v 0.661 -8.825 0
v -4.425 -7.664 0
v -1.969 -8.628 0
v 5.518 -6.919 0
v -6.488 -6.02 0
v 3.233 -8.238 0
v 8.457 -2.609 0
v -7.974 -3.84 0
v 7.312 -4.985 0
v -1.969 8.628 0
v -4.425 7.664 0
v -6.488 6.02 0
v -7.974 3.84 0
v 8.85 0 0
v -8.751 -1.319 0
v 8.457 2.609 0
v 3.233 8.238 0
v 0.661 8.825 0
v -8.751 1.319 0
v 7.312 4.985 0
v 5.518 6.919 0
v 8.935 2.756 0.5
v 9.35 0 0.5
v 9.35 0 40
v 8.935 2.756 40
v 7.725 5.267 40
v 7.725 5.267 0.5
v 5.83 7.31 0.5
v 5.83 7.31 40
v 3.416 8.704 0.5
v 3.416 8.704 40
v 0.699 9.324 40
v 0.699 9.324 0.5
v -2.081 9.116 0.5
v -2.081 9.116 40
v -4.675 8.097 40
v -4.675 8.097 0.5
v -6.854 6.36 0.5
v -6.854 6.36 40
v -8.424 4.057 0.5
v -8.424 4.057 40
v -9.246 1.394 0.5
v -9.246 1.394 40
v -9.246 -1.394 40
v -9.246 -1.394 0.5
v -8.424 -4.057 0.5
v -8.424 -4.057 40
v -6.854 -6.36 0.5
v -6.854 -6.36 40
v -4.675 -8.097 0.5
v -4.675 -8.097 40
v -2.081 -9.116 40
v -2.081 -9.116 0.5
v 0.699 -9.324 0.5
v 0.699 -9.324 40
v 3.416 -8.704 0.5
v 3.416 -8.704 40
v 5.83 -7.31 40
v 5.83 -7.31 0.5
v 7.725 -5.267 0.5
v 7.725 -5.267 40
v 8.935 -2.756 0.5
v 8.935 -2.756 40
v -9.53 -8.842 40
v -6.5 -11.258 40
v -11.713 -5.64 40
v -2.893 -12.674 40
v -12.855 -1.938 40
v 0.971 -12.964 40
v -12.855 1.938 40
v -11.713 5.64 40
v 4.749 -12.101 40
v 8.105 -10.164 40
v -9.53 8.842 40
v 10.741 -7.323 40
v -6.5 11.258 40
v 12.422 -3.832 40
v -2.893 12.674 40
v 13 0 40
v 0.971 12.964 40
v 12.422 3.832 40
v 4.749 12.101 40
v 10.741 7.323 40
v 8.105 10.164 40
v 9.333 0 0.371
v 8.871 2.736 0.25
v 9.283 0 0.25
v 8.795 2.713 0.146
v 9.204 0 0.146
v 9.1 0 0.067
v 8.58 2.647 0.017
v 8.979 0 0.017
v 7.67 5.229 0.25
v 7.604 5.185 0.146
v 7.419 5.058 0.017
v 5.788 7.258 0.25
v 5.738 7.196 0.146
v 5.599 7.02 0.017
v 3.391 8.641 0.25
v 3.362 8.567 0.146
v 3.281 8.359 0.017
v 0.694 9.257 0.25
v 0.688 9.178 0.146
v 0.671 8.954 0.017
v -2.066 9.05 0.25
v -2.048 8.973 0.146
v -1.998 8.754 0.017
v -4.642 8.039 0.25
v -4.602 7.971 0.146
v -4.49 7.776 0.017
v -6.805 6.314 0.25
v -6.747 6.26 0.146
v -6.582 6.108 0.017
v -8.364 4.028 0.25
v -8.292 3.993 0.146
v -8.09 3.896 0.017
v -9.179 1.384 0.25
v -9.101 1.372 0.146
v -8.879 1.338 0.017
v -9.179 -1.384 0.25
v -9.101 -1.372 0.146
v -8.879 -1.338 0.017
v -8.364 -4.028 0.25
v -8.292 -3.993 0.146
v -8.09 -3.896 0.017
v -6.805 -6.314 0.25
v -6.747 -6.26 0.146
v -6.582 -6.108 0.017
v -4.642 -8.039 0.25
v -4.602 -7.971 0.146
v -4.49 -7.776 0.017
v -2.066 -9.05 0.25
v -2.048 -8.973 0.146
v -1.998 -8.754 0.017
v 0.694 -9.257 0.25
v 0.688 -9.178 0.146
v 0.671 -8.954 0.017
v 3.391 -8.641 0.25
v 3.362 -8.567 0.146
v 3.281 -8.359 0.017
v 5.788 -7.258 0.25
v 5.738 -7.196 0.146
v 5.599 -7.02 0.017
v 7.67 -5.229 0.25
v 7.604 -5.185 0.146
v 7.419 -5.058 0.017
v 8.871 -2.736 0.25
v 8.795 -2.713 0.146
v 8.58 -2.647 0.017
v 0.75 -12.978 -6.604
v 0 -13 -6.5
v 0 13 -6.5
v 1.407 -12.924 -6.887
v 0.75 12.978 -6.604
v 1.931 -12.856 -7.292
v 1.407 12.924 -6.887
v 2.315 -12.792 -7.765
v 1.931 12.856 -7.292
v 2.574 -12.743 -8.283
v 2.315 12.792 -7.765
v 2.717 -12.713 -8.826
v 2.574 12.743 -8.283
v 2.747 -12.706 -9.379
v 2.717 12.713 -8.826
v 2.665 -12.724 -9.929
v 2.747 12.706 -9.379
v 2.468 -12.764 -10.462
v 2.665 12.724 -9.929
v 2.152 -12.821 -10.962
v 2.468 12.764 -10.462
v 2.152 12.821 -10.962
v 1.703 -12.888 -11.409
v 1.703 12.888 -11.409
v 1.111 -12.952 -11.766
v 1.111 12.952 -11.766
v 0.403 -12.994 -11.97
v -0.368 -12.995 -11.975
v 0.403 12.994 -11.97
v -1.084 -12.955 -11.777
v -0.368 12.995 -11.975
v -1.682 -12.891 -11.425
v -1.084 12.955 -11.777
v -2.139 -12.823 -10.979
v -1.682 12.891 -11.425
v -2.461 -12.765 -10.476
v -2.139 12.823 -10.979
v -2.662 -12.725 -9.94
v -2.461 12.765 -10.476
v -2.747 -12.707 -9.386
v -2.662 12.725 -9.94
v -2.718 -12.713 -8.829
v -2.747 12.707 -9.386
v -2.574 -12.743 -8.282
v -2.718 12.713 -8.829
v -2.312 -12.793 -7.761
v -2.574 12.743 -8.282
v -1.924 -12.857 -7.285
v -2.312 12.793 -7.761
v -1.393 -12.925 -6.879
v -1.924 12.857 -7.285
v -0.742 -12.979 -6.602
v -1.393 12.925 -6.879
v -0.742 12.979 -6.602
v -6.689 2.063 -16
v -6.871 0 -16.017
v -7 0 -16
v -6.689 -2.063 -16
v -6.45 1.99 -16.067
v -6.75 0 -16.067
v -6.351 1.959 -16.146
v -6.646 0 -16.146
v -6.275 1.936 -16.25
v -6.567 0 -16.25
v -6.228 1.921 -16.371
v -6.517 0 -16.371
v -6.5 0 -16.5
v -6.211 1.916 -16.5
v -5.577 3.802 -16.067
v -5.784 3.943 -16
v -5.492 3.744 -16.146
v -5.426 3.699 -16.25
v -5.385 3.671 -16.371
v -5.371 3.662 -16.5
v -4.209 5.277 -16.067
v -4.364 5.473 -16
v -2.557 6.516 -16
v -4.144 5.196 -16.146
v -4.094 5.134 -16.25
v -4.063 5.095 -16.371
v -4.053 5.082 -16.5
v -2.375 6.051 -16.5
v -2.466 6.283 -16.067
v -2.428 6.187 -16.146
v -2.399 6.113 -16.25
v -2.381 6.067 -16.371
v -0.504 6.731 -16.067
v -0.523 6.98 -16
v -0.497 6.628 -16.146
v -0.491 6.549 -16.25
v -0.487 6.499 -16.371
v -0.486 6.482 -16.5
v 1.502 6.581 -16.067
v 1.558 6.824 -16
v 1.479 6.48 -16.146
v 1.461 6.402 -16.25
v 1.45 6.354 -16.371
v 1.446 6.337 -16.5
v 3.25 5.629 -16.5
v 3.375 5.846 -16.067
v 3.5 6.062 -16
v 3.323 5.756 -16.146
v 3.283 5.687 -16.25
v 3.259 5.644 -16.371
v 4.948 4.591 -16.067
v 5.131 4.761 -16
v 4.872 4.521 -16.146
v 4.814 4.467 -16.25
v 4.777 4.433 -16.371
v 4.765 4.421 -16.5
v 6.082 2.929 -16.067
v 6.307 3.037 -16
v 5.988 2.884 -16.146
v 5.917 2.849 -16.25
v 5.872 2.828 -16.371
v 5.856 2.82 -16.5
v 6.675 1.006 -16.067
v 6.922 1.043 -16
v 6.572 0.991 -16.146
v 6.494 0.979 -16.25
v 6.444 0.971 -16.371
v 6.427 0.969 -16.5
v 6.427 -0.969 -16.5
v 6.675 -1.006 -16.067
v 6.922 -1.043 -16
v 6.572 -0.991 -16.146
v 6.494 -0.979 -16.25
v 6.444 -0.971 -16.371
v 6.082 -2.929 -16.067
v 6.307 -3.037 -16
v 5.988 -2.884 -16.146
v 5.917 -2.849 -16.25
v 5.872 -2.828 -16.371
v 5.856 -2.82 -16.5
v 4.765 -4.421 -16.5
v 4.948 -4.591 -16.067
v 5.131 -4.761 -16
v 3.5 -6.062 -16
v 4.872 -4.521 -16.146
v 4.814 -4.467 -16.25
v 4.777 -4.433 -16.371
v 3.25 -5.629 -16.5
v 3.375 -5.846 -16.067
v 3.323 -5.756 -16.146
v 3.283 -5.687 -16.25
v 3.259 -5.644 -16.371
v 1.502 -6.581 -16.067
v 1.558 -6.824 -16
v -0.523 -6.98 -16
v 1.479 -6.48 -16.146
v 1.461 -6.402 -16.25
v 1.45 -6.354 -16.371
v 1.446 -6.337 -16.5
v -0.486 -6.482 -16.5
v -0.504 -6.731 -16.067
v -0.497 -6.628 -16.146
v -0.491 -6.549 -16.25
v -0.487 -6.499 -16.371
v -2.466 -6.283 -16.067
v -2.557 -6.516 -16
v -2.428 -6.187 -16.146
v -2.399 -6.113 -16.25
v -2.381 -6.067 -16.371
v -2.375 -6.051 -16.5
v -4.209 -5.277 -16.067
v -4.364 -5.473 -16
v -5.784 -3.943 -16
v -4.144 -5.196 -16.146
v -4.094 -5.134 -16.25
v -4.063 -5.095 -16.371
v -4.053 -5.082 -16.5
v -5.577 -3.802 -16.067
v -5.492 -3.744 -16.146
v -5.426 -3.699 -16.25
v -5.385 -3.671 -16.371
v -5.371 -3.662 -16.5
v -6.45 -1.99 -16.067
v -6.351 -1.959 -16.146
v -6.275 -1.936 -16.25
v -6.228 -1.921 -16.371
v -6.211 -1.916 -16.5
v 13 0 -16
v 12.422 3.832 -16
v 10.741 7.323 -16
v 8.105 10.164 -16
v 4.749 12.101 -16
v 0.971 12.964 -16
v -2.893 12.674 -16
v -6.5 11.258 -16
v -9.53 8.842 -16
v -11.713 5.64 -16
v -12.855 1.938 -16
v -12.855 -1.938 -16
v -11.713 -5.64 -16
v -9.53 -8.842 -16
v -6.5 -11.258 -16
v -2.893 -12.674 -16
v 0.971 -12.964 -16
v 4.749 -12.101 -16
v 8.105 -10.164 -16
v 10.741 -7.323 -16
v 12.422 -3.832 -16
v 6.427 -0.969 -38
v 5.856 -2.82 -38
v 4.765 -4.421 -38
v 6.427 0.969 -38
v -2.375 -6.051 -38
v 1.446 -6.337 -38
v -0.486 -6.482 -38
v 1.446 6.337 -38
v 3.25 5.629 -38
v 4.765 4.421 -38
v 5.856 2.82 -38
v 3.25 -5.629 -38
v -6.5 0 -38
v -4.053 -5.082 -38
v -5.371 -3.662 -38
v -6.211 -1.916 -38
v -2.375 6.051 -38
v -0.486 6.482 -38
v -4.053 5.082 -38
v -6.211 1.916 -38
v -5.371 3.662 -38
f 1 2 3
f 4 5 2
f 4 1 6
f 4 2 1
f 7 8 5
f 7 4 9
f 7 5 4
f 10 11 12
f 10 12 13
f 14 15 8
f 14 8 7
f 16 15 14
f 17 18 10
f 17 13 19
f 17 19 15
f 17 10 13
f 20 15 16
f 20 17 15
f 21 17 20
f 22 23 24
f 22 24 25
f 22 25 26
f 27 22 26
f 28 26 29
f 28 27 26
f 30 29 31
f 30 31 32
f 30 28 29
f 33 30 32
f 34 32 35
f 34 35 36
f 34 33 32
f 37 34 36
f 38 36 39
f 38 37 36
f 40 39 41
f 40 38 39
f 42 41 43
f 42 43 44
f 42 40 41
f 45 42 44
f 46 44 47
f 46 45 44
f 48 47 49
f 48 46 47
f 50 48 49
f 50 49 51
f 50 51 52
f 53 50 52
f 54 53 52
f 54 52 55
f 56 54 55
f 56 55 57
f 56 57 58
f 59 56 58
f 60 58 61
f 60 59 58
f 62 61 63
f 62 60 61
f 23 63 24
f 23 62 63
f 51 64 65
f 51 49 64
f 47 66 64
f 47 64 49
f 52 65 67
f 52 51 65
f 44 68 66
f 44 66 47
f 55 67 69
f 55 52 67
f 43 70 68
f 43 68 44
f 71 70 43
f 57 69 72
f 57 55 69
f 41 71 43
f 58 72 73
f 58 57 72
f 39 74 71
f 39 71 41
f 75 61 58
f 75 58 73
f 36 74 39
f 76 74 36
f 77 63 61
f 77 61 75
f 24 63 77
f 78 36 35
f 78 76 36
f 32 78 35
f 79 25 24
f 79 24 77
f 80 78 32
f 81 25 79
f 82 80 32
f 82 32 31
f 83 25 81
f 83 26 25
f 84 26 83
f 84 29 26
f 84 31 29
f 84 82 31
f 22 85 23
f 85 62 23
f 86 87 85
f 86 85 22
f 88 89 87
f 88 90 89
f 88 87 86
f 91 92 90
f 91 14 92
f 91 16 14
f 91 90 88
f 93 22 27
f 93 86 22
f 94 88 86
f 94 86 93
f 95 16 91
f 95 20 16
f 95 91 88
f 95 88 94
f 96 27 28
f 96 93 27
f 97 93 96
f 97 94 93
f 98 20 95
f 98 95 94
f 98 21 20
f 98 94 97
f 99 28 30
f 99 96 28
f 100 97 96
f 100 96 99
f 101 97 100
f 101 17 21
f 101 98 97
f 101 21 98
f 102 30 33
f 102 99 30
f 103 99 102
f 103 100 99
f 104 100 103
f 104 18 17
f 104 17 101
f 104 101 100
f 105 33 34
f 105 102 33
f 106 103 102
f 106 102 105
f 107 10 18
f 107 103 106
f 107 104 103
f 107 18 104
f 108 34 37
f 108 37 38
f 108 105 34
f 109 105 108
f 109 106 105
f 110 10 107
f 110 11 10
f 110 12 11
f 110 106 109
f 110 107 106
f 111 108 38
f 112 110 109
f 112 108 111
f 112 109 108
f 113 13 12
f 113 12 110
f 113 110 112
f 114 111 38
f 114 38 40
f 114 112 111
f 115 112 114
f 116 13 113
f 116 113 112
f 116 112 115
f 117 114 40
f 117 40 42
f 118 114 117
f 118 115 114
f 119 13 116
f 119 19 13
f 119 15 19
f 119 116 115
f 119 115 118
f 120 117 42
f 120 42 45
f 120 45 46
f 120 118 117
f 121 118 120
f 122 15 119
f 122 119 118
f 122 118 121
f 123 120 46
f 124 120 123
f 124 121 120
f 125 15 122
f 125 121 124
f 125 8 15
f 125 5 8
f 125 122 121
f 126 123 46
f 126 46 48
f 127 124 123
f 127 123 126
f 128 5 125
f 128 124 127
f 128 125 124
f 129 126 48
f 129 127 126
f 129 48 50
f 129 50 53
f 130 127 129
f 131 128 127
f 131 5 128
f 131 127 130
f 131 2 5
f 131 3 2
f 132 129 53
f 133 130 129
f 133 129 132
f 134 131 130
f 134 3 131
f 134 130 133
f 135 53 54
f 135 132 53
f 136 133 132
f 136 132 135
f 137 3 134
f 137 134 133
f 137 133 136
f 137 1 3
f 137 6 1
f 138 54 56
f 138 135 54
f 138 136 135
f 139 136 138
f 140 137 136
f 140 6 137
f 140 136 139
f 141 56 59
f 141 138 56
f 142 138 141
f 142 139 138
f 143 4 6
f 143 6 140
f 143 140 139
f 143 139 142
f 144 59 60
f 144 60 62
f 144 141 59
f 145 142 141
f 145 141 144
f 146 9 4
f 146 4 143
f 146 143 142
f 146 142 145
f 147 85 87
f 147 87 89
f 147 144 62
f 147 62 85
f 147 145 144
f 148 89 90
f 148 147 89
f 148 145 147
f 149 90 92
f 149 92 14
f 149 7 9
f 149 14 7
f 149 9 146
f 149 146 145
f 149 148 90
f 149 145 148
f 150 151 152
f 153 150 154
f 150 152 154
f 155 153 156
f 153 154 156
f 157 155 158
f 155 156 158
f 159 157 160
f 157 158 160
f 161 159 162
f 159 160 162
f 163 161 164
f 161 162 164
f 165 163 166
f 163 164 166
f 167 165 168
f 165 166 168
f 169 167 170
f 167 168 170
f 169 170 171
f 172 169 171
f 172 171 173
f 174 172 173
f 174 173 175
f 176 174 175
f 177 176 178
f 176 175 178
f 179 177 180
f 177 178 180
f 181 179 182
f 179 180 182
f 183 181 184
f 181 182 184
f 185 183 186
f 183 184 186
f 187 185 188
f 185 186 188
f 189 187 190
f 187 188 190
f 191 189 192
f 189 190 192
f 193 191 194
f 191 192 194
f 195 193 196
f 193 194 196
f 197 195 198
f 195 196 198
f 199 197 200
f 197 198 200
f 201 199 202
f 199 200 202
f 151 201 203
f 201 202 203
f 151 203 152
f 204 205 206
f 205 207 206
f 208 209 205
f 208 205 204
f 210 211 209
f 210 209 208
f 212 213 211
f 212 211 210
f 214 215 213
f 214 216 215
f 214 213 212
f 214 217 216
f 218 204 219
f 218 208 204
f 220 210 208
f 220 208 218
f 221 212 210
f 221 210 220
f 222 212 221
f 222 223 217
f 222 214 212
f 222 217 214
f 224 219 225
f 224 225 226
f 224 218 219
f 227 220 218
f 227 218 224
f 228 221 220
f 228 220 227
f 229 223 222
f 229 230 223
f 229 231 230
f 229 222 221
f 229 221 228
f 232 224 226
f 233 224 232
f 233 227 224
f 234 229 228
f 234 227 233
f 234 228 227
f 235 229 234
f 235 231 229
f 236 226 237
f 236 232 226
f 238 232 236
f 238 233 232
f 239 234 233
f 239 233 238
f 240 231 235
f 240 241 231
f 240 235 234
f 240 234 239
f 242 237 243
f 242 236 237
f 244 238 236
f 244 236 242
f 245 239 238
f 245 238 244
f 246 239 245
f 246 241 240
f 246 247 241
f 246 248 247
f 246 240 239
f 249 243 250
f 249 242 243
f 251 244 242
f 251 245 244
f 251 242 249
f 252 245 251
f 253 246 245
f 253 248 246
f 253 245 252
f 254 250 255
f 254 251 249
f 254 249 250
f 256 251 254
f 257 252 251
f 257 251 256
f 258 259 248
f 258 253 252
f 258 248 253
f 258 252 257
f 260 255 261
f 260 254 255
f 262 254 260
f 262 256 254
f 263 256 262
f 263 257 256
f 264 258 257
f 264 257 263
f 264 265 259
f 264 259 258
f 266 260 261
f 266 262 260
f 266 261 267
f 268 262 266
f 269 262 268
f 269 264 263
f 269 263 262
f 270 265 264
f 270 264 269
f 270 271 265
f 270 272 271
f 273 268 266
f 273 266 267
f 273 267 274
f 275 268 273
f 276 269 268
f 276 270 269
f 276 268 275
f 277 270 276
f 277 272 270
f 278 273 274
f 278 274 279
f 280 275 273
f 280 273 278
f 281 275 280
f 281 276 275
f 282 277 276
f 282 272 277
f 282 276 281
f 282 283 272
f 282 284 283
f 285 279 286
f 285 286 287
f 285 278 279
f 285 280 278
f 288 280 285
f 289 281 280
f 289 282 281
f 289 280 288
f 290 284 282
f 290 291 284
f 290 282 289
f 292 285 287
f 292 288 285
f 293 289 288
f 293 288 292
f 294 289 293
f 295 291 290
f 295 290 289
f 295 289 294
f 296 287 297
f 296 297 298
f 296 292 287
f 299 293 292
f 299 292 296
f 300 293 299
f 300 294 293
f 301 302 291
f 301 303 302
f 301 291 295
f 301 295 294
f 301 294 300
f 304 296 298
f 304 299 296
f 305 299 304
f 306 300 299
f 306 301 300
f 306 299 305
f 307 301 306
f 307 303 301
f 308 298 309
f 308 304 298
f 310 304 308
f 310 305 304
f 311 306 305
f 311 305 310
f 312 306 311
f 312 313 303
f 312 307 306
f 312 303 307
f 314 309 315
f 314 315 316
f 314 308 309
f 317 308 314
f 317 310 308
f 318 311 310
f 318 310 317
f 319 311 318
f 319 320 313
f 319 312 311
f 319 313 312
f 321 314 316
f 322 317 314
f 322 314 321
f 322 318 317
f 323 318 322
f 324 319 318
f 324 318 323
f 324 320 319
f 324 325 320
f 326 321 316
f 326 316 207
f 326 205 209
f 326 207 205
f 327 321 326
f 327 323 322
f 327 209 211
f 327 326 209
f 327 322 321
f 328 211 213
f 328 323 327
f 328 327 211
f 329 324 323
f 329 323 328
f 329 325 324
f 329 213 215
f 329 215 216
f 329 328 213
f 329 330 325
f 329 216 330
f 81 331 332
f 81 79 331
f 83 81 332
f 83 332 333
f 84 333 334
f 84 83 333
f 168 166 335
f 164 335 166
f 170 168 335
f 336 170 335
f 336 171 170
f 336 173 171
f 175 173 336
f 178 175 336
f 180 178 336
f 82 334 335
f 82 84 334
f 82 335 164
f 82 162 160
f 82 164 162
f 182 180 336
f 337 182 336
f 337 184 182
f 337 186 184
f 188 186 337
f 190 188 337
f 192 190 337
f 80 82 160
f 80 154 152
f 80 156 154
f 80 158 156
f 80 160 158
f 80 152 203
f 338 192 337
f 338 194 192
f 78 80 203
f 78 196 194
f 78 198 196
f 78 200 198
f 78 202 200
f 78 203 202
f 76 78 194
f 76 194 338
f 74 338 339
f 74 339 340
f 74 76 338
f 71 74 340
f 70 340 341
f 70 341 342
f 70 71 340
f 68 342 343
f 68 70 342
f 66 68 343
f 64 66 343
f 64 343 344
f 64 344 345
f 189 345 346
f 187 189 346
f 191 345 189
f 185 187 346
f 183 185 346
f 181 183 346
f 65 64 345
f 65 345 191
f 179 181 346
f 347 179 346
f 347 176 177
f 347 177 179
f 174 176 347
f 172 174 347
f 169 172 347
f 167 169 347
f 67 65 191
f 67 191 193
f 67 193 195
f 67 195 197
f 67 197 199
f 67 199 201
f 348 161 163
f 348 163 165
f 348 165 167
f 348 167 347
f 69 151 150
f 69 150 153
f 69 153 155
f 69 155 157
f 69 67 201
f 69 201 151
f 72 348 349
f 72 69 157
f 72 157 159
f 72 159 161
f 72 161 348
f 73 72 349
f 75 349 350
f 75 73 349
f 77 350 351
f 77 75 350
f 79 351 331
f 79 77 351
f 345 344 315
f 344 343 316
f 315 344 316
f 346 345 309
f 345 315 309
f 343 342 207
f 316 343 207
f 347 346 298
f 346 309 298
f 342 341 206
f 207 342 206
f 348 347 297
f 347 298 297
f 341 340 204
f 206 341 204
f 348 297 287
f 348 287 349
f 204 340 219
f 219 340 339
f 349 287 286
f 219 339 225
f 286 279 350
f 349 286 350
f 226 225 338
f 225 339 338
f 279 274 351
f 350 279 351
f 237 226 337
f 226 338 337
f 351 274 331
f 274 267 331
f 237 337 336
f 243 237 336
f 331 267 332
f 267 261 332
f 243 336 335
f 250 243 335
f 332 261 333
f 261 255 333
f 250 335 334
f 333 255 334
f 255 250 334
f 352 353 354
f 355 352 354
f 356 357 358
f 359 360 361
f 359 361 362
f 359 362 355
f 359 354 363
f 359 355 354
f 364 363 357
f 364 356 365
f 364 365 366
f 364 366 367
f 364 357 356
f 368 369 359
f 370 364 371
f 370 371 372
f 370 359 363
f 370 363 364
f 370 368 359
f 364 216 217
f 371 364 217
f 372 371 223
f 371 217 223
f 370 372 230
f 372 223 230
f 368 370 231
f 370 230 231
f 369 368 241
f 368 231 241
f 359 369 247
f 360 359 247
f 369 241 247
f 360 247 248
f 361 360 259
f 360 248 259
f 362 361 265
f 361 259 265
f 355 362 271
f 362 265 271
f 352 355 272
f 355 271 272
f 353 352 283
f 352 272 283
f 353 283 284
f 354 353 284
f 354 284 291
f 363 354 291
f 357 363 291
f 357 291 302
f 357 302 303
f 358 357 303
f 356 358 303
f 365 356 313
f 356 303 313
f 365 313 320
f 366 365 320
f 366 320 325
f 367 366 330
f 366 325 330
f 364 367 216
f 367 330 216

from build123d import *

# Parameters (mm, degrees)
CROQUIS1_R                 = 13
CROQUIS1_R_2               = 9.35
SALIENTE_EXTRUIR1_DEPTH    = 40
SALIENTE_EXTRUIR2_START    = -16
CROQUIS1_2_R               = 13
SALIENTE_EXTRUIR2_DEPTH    = 16
CROQUIS2_R                 = 6.5
SALIENTE_EXTRUIR3_DEPTH    = 22
REDONDEO1_R                = 0.5
REDONDEO2_R                = 0.5
CORTAR_EXTRUIR1_DEPTH      = 45.022721406
CORTAR_EXTRUIR1_DEPTH_BACK = 45.022721406
CROQUIS3_R                 = 2.75


with BuildPart() as part:
    # Croquis1 → Saliente-Extruir1 (new body)
    with BuildSketch(Plane.XY):
        Circle(CROQUIS1_R)
        Circle(CROQUIS1_R_2, mode=Mode.SUBTRACT)
    extrude(amount=SALIENTE_EXTRUIR1_DEPTH)

    # Croquis1<2> → Saliente-Extruir2 (add)
    with BuildSketch(Plane.XY.offset(SALIENTE_EXTRUIR2_START)):
        Circle(CROQUIS1_2_R)
    extrude(amount=SALIENTE_EXTRUIR2_DEPTH)

    # Croquis2 → Saliente-Extruir3 (add)
    with BuildSketch(Plane(origin=(0, 0, -16), x_dir=(-1, 0, 0), z_dir=(0, 0, -1))):
        Circle(CROQUIS2_R)
    extrude(amount=SALIENTE_EXTRUIR3_DEPTH)

    # Redondeo1
    redondeo1_edges = [part.edges().sort_by_distance(p)[0] for p in [
        (6.5, 0, -16),
    ]]
    fillet(redondeo1_edges, radius=REDONDEO1_R)

    # Redondeo2
    redondeo2_edges = [part.edges().sort_by_distance(p)[0] for p in [
        (-9.35, 0, 0),
    ]]
    fillet(redondeo2_edges, radius=REDONDEO2_R)

    # Croquis3 → Cortar-Extruir1 (cut, two sides: drawn at the far end of the back side and taken through both)
    with BuildSketch(Plane(origin=(0, 0, 0), x_dir=(1, 0, 0), z_dir=(0, 1, 0)).offset(-CORTAR_EXTRUIR1_DEPTH_BACK)):
        with Locations((0, 9.25)):
            Circle(CROQUIS3_R)
    extrude(amount=CORTAR_EXTRUIR1_DEPTH + CORTAR_EXTRUIR1_DEPTH_BACK, mode=Mode.SUBTRACT)


solid = part.part
